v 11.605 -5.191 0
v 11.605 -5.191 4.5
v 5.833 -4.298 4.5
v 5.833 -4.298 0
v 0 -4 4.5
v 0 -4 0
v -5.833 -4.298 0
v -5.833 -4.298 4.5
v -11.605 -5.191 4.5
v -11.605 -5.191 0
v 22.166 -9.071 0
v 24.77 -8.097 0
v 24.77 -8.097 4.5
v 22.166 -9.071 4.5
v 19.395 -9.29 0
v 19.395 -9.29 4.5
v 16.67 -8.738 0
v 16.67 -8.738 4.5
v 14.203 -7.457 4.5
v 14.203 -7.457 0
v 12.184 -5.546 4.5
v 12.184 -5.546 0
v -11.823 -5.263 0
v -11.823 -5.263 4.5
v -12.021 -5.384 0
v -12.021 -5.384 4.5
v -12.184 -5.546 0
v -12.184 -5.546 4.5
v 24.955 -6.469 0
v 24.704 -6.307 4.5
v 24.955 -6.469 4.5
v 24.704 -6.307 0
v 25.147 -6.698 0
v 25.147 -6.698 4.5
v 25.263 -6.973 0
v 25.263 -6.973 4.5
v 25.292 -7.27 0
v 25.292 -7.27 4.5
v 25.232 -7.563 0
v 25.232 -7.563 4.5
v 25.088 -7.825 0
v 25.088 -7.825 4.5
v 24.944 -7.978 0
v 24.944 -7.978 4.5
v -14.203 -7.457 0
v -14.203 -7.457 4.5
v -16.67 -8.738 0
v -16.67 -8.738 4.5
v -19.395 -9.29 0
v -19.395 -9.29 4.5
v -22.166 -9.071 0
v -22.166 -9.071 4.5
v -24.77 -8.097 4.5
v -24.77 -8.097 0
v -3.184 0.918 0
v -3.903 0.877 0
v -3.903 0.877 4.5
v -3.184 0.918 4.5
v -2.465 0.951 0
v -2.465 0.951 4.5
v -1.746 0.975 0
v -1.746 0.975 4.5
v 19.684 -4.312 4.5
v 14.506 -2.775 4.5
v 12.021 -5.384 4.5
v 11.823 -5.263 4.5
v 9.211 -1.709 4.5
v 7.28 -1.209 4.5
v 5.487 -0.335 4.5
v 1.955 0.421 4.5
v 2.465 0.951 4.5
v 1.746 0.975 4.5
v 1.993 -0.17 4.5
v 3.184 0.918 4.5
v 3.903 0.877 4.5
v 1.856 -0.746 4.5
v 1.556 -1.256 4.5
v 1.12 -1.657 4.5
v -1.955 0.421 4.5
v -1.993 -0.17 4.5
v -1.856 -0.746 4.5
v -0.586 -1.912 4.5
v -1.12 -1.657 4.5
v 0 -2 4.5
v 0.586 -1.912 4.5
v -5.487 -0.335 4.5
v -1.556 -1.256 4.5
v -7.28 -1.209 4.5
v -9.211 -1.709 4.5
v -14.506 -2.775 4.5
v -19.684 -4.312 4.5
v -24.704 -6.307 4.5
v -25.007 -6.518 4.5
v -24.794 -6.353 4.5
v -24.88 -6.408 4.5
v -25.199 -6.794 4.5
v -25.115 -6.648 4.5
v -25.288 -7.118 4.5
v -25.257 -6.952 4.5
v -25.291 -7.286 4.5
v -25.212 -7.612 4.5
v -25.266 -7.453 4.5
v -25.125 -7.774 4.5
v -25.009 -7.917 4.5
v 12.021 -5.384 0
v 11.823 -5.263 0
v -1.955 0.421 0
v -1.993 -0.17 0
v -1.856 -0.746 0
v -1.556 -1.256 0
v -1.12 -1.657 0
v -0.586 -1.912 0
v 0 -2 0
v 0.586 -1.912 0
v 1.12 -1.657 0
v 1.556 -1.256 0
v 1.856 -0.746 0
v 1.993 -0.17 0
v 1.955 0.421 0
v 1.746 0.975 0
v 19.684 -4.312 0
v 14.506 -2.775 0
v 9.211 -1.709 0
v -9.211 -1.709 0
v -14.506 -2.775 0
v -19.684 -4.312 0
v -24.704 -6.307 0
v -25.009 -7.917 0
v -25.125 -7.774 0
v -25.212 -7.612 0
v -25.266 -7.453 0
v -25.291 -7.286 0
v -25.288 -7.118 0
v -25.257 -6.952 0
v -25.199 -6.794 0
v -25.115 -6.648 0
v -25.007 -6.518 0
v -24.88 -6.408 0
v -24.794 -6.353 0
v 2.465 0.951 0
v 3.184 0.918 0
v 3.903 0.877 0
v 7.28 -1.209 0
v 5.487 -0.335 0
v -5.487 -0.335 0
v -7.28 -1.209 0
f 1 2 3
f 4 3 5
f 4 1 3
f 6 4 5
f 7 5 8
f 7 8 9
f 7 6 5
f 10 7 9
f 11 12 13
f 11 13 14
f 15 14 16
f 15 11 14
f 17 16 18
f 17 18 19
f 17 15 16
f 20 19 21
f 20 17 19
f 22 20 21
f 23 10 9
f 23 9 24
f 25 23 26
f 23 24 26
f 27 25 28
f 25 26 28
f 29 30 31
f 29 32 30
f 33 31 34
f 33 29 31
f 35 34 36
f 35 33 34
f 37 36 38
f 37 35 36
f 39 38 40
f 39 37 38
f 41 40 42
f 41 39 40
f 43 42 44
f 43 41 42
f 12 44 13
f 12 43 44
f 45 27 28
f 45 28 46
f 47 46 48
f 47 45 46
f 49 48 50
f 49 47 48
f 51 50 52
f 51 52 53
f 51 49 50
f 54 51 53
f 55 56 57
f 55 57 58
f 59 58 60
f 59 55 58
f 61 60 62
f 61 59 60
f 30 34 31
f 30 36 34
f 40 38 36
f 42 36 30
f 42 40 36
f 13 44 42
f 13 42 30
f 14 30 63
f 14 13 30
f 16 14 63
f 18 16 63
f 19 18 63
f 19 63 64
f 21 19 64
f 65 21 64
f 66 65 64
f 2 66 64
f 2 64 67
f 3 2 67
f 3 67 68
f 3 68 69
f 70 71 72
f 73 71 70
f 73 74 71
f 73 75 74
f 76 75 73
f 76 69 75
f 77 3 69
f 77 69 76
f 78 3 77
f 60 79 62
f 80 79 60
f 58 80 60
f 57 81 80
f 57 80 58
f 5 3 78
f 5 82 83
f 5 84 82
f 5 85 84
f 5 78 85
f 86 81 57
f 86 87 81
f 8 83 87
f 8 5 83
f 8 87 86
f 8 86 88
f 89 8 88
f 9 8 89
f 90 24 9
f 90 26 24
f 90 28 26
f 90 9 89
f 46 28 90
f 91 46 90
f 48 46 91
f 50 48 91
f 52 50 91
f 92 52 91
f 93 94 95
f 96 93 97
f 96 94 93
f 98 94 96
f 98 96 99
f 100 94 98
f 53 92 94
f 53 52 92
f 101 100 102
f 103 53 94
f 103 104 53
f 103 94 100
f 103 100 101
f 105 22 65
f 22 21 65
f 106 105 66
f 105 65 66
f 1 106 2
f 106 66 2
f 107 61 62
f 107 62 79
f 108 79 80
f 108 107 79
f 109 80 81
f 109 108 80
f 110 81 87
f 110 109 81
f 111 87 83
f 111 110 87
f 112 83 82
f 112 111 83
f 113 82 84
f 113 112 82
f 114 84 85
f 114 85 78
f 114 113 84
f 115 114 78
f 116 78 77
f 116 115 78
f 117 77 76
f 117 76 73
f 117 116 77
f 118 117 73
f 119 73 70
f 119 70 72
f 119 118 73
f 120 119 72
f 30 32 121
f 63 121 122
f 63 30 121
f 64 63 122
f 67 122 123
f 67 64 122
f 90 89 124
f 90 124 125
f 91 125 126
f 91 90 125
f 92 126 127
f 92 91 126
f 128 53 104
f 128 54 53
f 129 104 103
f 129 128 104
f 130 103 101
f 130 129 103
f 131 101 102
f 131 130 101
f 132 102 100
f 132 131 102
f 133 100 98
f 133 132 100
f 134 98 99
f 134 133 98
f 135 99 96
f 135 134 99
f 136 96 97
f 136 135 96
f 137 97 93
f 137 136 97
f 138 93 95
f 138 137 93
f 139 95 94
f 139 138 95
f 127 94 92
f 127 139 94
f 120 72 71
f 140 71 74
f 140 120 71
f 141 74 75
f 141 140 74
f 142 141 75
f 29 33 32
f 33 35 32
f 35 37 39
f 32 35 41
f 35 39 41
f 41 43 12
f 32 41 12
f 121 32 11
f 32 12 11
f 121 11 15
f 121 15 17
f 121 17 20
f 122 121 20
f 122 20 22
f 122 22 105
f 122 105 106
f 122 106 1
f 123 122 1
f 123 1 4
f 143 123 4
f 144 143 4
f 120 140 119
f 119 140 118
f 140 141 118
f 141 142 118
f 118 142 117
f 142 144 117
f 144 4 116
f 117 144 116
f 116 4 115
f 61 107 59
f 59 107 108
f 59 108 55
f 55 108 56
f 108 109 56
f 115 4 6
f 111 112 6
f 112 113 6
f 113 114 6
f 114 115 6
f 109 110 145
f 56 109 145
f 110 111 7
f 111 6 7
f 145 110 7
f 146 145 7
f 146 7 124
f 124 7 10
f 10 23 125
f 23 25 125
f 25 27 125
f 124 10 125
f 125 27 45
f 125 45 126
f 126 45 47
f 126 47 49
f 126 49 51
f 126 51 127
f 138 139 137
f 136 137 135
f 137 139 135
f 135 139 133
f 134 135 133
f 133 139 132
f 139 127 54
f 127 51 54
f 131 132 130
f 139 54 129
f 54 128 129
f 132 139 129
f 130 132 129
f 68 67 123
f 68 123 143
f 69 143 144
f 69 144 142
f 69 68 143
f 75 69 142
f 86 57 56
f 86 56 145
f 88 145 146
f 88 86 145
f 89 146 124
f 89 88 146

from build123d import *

# Parameters (mm, degrees)
BOSS_EXTRUDE1_DEPTH = 4.5
CUT_EXTRUDE1_DEPTH  = 30.661852099
FILLET1_R           = 10
FILLET2_R           = 1


with BuildPart() as part:
    # Sketch2 → Boss-Extrude1 (new body)
    with BuildSketch(Plane.XY):
        with BuildLine():
            ThreePointArc((-1.74598224, 0.975472203), (0, -2), (1.74598224, 0.975472203))
            ThreePointArc((1.74598224, 0.975472203), (15.131316317, -0.869946427), (27.801563151, -5.564366886))
            ThreePointArc((27.801563151, -5.564366886), (19.812423986, -9.306761236), (11.969278721, -5.267338946))
            ThreePointArc((11.969278721, -5.267338946), (0, -4), (-11.969278721, -5.267338946))
            ThreePointArc((-11.969278721, -5.267338946), (-19.812423986, -9.306761236), (-27.801563151, -5.564366886))
            ThreePointArc((-27.801563151, -5.564366886), (-15.131316317, -0.869946427), (-1.74598224, 0.975472203))
        make_face()
    extrude(amount=BOSS_EXTRUDE1_DEPTH)

    # Sketch3 → Cut-Extrude1 (cut, through all)
    with BuildSketch(Plane.XY.offset(4.5)):
        with BuildLine():
            ThreePointArc((-3.839229312, -1.122638985), (-15.367183828, -2.995958524), (-26.315878496, -7.061563826))
            ThreePointArc((-26.315878496, -7.061563826), (-27.098305385, -6.352245543), (-27.801563151, -5.564366886))
            ThreePointArc((-27.801563151, -5.564366886), (-16.175980809, -1.141817117), (-3.902593708, 0.877361015))
            ThreePointArc((-3.902593708, 0.877361015), (-3.997993987, -0.126665237), (-3.839229312, -1.122638985))
        make_face()
        with BuildLine():
            ThreePointArc((26.315878496, -7.061563826), (15.367183828, -2.995958524), (3.839229312, -1.122638985))
            ThreePointArc((3.839229312, -1.122638985), (3.997993987, -0.126665237), (3.902593708, 0.877361015))
            ThreePointArc((3.902593708, 0.877361015), (16.175980809, -1.141817117), (27.801563151, -5.564366886))
            ThreePointArc((27.801563151, -5.564366886), (27.098305385, -6.352245543), (26.315878496, -7.061563826))
        make_face()
    extrude(amount=-CUT_EXTRUDE1_DEPTH, mode=Mode.SUBTRACT)

    # Fillet1
    # the kernel refuses this fillet: 10 mm, written as the material it adds along each edge
    with BuildSketch(Plane(origin=(-3.839229312, -1.122638985, 4.5), x_dir=(-0.9940877478699028, -0.10857969209269472, 0), z_dir=(0, 0, -1))) as fillet1_piece_1:
        with BuildLine():
            CenterArc((5.852686638, 9.989908799), FILLET1_R, 233.080982265, 34.344798216)
            Line((-0.154169614, 1.995055582), (-0.27430674, 1.835158518))
            ThreePointArc((-0.27430674, 1.835158518), (-0.14972201, 0.99191469), (-0.196921331, 0.034956966))
            Line((-0.196921331, 0.034956966), (0.008982698, -0.199798176))
            ThreePointArc((0.008982698, -0.199798176), (2.701775857, -0.139296277), (5.394569015, -0.199798176))
            Line((5.394569015, -0.199798176), (5.403551713, 0))
        make_face()
    extrude(amount=4.5)
    with BuildSketch(Plane(origin=(3.839229312, -1.122638985, 4.5), x_dir=(0.9940877478699031, -0.10857969209269294, 0), z_dir=(0, 0, -1))) as fillet1_piece_2:
        with BuildLine():
            CenterArc((5.852686638, -9.989908799), FILLET1_R, 92.574219519, 34.344798216)
            Line((-0.154169614, -1.995055582), (-0.27430674, -1.835158518))
            ThreePointArc((-0.27430674, -1.835158518), (-0.14972201, -0.99191469), (-0.196921331, -0.034956966))
            Line((-0.196921331, -0.034956966), (0.008982698, 0.199798176))
            ThreePointArc((0.008982698, 0.199798176), (2.701775857, 0.139296277), (5.394569015, 0.199798176))
            Line((5.394569015, 0.199798176), (5.403551713, 0))
        make_face()
    extrude(amount=4.5)

    # Fillet2
    fillet2_edges = [part.edges().sort_by_distance(p)[0] for p in [
        (11.969278721, -5.267338946, 2.25),
        (-11.969278721, -5.267338946, 2.25),
        (26.315878496, -7.061563826, 2.25),
        (-26.315878496, -7.061563826, 2.25),
    ]]
    fillet(fillet2_edges, radius=FILLET2_R)


solid = part.part
